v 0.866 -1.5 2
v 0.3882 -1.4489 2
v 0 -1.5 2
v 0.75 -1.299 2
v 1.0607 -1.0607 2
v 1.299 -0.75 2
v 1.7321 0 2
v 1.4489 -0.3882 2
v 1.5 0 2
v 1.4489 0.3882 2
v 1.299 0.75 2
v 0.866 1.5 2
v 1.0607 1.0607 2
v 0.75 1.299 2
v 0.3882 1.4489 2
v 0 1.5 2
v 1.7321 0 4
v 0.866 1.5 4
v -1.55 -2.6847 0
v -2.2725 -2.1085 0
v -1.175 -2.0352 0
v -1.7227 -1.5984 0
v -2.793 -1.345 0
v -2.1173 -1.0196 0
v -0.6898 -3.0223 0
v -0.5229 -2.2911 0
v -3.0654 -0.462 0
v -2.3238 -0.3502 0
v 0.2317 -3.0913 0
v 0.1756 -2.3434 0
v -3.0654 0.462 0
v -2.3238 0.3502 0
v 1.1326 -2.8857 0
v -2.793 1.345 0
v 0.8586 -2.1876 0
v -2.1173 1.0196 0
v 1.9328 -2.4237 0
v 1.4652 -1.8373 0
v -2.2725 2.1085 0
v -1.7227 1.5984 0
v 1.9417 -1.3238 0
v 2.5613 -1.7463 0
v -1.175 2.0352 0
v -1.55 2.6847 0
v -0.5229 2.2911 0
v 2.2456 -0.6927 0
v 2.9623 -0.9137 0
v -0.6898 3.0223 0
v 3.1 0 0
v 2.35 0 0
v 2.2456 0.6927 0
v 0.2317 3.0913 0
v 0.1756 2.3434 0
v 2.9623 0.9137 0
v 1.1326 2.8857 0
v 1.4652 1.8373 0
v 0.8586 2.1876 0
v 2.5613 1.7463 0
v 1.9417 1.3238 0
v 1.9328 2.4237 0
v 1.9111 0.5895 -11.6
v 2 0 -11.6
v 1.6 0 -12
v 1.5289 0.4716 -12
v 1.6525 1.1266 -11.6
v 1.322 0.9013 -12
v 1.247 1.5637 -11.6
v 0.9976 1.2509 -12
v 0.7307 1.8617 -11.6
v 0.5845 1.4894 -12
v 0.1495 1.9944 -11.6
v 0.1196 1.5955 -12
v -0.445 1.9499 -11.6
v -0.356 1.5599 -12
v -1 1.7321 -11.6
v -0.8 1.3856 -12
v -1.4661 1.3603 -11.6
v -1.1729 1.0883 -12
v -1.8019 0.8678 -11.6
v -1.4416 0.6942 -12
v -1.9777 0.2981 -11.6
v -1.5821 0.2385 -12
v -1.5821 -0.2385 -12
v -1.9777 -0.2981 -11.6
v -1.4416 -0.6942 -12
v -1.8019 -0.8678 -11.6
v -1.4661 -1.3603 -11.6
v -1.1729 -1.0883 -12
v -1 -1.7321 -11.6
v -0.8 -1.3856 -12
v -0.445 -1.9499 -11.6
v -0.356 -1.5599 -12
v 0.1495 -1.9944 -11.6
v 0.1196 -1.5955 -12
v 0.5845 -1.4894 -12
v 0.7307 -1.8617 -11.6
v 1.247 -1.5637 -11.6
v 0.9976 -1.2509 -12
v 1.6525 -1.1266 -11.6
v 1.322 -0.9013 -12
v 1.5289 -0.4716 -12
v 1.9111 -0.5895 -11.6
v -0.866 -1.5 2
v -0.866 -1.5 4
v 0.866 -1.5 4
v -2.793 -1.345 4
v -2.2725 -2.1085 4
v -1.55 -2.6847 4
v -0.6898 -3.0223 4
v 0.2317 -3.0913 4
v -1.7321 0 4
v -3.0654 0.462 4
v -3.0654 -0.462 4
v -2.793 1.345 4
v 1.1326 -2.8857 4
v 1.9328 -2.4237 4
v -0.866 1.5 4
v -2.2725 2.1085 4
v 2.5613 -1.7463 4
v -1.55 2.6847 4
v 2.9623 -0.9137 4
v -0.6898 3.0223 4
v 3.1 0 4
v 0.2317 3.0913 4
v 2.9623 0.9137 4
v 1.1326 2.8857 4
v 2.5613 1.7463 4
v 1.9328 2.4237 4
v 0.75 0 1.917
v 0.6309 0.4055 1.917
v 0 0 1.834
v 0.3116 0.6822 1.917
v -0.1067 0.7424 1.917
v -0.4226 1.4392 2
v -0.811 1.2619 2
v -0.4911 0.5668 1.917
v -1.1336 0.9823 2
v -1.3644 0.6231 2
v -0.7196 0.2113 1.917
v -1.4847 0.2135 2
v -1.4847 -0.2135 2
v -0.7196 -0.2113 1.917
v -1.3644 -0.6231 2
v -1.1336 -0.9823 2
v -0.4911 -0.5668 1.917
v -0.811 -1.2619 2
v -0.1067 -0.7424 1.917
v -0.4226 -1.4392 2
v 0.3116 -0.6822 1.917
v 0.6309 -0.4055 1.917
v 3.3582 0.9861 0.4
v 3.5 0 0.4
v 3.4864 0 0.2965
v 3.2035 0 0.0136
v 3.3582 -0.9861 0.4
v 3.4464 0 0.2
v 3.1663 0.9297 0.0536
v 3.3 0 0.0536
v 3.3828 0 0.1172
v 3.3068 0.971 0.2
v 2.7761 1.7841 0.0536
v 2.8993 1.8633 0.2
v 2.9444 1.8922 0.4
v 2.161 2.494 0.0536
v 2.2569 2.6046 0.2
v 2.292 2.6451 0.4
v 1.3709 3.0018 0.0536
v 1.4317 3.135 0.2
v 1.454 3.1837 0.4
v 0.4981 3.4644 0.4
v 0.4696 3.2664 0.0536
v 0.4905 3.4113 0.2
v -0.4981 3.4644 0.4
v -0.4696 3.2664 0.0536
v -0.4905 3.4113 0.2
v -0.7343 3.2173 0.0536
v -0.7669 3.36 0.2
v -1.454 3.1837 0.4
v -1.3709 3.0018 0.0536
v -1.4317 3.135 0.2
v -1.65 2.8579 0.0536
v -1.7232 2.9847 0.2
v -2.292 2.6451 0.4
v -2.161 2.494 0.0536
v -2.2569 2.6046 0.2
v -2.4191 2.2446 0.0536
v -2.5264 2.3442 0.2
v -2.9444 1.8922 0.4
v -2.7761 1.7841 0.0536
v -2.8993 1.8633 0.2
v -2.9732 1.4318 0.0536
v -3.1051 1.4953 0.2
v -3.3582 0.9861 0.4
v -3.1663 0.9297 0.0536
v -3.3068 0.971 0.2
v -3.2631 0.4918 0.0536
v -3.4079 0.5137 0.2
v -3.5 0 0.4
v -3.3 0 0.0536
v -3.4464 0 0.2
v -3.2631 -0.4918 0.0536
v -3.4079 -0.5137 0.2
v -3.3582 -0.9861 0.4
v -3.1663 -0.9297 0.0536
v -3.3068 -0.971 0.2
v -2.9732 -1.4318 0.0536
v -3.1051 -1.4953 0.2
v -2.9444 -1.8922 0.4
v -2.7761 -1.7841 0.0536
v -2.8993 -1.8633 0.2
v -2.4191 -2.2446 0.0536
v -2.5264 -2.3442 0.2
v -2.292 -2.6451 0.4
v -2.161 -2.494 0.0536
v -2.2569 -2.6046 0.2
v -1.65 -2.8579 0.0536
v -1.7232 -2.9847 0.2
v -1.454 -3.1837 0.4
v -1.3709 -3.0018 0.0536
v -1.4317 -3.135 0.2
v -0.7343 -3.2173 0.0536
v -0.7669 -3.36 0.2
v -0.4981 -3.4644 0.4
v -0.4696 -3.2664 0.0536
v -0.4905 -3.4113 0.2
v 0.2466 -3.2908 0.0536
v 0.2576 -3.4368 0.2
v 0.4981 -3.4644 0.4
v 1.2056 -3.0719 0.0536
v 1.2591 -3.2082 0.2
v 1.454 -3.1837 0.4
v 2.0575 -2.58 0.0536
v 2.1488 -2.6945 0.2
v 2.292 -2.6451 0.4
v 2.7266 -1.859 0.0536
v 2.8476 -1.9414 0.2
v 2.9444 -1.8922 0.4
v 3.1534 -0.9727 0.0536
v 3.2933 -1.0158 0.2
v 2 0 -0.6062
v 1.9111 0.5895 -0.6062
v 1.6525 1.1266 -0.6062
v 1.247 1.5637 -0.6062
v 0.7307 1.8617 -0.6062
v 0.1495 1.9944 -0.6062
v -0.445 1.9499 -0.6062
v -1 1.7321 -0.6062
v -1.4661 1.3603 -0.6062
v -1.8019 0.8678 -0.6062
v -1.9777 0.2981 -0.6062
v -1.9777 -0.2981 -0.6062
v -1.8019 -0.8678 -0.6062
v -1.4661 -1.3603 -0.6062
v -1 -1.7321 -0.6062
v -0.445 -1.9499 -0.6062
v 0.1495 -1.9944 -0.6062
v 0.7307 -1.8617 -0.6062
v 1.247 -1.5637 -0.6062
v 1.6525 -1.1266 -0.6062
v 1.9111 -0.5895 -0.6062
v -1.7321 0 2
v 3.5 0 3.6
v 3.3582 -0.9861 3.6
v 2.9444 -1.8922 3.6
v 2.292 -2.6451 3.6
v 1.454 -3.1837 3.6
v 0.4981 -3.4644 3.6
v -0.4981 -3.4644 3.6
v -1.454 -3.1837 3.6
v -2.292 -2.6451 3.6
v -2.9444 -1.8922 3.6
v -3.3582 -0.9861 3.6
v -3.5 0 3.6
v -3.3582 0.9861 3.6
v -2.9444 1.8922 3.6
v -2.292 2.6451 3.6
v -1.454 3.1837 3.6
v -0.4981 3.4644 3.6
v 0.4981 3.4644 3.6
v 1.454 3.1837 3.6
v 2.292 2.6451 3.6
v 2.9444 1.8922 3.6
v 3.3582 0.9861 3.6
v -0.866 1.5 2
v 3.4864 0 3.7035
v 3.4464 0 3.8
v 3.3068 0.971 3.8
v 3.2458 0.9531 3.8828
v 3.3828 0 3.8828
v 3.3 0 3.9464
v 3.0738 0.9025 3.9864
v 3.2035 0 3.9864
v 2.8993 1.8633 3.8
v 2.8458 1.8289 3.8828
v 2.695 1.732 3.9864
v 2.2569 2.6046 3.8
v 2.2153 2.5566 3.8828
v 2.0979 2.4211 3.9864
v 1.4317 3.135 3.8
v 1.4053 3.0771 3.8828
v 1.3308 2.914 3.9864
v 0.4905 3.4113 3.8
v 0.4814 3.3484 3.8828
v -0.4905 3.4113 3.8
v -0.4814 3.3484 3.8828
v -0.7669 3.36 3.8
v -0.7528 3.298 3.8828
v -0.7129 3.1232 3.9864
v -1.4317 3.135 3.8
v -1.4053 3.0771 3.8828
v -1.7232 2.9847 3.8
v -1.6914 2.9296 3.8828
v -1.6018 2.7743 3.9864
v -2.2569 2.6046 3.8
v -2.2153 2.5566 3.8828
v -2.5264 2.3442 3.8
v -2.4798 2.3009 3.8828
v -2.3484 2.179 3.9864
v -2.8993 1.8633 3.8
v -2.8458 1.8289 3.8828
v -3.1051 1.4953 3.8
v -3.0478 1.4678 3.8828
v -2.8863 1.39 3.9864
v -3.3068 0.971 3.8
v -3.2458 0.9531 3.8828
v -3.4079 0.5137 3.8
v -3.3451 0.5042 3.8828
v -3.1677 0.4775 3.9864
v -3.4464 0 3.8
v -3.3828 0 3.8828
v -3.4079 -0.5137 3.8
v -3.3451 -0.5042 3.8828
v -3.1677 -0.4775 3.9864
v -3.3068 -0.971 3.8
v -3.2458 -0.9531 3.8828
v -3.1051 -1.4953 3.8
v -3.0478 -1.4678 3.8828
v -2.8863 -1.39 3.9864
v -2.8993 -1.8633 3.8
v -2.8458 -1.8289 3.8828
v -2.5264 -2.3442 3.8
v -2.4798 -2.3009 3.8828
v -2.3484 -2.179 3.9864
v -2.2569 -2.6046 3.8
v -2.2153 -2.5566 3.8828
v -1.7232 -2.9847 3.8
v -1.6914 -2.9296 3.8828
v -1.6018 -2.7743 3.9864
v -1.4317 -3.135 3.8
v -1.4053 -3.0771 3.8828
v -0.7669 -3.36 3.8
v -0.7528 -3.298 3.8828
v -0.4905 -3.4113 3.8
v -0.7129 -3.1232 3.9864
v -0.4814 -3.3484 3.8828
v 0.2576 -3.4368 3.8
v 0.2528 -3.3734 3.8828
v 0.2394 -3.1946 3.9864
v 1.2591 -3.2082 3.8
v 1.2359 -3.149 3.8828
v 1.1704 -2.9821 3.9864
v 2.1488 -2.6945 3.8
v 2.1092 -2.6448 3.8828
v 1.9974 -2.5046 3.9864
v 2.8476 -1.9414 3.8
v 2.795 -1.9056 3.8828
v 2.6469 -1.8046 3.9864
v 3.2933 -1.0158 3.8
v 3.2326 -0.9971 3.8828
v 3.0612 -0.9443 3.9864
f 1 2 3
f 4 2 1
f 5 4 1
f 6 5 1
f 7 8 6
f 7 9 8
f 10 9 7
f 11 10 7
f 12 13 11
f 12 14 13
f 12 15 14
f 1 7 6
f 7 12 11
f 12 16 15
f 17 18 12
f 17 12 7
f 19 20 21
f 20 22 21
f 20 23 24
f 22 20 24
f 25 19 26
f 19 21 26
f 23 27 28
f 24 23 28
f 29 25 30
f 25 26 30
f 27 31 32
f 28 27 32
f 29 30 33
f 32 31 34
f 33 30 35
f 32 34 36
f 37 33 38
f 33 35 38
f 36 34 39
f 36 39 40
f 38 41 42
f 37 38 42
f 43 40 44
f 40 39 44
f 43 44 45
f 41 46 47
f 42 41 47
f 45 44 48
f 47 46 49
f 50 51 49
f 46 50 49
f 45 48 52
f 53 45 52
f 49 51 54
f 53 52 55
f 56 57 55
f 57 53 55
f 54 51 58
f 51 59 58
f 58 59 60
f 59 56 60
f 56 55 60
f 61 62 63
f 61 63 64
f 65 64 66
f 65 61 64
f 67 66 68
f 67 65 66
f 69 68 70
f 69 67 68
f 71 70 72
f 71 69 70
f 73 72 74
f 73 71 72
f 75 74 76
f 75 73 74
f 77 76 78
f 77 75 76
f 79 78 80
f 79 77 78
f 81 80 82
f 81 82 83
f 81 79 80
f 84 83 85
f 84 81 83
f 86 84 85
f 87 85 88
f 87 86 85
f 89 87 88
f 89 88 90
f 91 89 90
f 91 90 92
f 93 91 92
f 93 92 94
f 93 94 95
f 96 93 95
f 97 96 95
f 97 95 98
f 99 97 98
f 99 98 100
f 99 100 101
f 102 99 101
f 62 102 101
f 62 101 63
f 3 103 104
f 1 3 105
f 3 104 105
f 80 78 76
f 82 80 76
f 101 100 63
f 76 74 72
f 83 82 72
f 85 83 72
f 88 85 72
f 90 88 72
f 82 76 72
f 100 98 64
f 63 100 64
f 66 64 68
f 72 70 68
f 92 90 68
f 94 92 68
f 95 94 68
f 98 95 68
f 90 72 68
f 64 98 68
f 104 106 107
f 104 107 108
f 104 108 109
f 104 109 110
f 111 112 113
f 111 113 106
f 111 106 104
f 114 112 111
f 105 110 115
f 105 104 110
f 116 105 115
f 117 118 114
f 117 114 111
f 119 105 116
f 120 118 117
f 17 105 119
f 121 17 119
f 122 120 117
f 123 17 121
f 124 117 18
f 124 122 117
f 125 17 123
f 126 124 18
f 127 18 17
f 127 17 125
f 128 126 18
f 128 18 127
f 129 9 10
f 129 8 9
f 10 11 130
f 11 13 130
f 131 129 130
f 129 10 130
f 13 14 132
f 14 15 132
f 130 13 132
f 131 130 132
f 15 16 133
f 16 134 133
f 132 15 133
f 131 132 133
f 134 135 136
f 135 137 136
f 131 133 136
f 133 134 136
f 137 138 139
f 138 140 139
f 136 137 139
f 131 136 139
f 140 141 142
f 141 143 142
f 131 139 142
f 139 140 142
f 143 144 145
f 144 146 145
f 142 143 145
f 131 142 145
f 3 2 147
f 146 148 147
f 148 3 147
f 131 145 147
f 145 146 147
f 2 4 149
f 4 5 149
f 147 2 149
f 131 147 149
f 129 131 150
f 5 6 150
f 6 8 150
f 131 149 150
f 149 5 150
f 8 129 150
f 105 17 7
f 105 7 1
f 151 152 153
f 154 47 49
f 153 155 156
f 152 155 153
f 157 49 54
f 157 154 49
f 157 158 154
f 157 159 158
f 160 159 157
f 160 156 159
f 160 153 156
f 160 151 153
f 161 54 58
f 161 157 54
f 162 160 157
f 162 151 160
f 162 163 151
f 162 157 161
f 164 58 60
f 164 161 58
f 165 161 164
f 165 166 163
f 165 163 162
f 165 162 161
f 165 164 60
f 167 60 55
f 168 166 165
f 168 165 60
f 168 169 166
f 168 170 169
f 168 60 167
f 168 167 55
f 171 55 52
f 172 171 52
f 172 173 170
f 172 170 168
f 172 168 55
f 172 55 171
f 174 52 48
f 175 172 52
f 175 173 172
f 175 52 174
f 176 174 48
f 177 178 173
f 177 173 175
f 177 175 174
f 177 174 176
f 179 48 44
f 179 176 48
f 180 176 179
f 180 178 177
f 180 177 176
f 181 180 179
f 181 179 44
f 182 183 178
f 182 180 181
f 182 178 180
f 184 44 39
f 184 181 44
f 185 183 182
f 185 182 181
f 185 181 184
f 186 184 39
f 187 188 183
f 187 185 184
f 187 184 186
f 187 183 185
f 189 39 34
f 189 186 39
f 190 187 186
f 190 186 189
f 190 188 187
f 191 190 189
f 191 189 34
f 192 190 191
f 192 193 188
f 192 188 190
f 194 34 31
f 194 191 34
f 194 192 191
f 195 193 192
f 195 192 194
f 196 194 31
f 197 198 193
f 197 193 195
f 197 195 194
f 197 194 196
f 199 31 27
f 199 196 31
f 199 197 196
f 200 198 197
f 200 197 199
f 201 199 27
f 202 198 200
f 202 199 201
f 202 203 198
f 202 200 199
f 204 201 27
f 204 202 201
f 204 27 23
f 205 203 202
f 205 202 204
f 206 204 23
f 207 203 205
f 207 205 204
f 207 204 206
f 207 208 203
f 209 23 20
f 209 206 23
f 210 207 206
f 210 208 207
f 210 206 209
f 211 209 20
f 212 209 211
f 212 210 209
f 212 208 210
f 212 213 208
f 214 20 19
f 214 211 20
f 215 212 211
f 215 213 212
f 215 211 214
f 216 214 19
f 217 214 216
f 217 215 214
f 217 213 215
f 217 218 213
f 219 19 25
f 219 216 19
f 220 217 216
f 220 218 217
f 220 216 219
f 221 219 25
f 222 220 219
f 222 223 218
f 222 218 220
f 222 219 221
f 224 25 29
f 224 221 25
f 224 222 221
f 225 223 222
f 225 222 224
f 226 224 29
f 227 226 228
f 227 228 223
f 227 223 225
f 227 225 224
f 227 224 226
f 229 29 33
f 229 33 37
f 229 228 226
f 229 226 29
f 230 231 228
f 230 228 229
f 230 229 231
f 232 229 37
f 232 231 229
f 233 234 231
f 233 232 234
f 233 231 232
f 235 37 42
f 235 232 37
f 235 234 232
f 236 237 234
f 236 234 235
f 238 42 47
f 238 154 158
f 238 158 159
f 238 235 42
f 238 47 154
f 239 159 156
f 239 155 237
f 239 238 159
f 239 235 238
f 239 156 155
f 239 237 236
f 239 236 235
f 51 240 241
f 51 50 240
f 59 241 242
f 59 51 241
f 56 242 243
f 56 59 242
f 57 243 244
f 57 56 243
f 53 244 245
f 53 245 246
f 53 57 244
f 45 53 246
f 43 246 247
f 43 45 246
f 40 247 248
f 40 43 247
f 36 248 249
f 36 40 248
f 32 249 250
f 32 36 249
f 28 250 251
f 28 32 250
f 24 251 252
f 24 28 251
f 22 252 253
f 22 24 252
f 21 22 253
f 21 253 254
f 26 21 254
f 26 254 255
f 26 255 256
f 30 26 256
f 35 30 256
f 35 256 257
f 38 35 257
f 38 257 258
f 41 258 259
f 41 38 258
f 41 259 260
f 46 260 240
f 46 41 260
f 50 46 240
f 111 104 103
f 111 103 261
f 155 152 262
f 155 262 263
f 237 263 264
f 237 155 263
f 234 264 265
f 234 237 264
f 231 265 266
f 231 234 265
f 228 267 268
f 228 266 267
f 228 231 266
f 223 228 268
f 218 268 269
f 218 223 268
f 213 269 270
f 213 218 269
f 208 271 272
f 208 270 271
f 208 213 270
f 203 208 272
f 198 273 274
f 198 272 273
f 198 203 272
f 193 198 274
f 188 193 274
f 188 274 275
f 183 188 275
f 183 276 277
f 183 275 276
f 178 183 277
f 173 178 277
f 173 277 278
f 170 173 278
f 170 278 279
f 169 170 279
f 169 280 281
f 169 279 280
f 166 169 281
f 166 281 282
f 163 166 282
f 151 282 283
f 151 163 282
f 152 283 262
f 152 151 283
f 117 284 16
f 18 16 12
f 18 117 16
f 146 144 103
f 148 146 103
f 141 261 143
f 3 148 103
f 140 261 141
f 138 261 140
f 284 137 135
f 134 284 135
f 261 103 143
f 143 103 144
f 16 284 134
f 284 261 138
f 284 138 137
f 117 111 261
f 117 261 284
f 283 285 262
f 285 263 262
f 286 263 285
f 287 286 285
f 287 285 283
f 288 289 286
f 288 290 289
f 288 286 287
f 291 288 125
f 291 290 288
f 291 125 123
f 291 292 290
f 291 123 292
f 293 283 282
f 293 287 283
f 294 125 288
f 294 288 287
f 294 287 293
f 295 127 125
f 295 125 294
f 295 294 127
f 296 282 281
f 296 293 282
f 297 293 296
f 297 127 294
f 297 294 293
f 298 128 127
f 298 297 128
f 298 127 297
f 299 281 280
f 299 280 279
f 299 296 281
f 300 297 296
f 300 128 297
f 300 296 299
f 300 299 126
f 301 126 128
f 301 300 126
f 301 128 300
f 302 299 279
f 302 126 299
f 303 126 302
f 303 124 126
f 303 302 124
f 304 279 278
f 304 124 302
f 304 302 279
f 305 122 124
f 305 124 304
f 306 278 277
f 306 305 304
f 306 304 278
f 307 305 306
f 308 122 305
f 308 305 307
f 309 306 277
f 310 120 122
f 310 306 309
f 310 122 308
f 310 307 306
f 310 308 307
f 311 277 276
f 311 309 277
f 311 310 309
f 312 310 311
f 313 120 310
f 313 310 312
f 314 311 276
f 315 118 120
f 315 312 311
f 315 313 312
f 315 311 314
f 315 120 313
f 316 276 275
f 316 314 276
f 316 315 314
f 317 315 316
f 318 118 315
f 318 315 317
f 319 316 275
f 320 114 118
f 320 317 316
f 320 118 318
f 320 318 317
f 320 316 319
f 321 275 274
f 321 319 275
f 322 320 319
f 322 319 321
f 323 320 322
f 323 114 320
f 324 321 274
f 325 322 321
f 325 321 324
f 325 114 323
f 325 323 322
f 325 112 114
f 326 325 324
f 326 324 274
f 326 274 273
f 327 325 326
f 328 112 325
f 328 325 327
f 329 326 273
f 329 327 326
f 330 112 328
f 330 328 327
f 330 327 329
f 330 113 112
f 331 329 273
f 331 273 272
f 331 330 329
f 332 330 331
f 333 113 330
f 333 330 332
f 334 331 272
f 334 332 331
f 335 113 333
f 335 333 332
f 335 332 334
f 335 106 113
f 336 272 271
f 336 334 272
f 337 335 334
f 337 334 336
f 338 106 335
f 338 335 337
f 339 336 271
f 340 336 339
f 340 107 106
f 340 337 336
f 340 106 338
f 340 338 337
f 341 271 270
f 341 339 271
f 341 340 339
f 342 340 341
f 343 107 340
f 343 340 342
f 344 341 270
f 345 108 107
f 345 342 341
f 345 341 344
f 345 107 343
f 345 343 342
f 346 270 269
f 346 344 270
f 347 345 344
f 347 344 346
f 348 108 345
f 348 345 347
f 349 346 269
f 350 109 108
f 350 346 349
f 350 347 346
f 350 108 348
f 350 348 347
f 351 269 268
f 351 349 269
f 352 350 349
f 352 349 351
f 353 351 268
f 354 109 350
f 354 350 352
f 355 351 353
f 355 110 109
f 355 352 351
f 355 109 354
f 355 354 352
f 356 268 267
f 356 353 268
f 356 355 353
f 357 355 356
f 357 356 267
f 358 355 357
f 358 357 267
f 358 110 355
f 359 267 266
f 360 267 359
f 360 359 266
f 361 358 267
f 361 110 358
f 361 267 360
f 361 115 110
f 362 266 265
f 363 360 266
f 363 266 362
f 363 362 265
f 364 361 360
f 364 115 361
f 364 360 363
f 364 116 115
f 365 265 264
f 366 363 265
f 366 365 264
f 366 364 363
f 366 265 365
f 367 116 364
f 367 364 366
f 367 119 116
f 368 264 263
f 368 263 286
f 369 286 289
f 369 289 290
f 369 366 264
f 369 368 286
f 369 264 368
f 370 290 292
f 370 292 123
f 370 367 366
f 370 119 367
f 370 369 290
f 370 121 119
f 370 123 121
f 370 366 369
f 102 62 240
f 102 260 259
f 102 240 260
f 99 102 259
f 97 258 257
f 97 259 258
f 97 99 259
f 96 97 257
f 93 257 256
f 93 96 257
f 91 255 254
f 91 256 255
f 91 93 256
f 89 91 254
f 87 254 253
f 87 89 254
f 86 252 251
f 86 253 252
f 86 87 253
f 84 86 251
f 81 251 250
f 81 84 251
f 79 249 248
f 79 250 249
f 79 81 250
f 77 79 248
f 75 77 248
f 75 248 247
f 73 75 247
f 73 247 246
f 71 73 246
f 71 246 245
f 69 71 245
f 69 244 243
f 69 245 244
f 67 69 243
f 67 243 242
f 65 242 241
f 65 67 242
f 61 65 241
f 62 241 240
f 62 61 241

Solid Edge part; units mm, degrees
sketch "Sketch1" plane through (0, 0, 0) normal (0, -1, 0) x (1, 0, 0)
  line L0 (3.5, 4) -> (3.5, 0)
  line L1 (3.5, 0) -> (2.35, 0)
  line L2 (2.35, 0) -> (2, -0.6062)
  line L3 (2, -0.6062) -> (2, -12)
  line L4 (2, -12) -> (0, -12)
  line L5 (1.5, 2) -> (0, 1.834)
  line L6 (1.5, 4) -> (1.5, 2)
  line L7 (3.5, 4) -> (1.5, 4)
  dimension "D1" = 2
  dimension "D2" = 12
  dimension "D3" = 4
revolve "RevolvedProtrusion1" add sketch "Sketch1" angle 360 about axis through (0, 0, -6) along (0, 0, 1)
cosmetic_thread "Thread1" size "M4"
chamfer "mounting_chamfer" distance 0.4 angle 45 1 edges at (-2, 0, -12)
fillet "head_round" radius 0.4 2 edges at (-3.5, 0, 0) (-3.5, 0, 4)
sketch "Sketch2" plane through (0, 0, 4) normal (0, 0, 1) x (0, 1, 0)
  line L0 (-1.5, 0.866) -> (-1.5, -0.866)
  line L1 (0, -1.7321) -> (-1.5, -0.866)
  line L2 (1.5, -0.866) -> (0, -1.7321)
  line L3 (1.5, 0.866) -> (1.5, -0.866)
  line L4 (0, 1.7321) -> (1.5, 0.866)
  line L5 (-1.5, 0.866) -> (0, 1.7321)
extrude "Cutout1" cut sketch "Sketch2" against normal up to vertex (2 mm away)
properties part number "STD-DIN912-M4x12" material "Galvanized steel"
